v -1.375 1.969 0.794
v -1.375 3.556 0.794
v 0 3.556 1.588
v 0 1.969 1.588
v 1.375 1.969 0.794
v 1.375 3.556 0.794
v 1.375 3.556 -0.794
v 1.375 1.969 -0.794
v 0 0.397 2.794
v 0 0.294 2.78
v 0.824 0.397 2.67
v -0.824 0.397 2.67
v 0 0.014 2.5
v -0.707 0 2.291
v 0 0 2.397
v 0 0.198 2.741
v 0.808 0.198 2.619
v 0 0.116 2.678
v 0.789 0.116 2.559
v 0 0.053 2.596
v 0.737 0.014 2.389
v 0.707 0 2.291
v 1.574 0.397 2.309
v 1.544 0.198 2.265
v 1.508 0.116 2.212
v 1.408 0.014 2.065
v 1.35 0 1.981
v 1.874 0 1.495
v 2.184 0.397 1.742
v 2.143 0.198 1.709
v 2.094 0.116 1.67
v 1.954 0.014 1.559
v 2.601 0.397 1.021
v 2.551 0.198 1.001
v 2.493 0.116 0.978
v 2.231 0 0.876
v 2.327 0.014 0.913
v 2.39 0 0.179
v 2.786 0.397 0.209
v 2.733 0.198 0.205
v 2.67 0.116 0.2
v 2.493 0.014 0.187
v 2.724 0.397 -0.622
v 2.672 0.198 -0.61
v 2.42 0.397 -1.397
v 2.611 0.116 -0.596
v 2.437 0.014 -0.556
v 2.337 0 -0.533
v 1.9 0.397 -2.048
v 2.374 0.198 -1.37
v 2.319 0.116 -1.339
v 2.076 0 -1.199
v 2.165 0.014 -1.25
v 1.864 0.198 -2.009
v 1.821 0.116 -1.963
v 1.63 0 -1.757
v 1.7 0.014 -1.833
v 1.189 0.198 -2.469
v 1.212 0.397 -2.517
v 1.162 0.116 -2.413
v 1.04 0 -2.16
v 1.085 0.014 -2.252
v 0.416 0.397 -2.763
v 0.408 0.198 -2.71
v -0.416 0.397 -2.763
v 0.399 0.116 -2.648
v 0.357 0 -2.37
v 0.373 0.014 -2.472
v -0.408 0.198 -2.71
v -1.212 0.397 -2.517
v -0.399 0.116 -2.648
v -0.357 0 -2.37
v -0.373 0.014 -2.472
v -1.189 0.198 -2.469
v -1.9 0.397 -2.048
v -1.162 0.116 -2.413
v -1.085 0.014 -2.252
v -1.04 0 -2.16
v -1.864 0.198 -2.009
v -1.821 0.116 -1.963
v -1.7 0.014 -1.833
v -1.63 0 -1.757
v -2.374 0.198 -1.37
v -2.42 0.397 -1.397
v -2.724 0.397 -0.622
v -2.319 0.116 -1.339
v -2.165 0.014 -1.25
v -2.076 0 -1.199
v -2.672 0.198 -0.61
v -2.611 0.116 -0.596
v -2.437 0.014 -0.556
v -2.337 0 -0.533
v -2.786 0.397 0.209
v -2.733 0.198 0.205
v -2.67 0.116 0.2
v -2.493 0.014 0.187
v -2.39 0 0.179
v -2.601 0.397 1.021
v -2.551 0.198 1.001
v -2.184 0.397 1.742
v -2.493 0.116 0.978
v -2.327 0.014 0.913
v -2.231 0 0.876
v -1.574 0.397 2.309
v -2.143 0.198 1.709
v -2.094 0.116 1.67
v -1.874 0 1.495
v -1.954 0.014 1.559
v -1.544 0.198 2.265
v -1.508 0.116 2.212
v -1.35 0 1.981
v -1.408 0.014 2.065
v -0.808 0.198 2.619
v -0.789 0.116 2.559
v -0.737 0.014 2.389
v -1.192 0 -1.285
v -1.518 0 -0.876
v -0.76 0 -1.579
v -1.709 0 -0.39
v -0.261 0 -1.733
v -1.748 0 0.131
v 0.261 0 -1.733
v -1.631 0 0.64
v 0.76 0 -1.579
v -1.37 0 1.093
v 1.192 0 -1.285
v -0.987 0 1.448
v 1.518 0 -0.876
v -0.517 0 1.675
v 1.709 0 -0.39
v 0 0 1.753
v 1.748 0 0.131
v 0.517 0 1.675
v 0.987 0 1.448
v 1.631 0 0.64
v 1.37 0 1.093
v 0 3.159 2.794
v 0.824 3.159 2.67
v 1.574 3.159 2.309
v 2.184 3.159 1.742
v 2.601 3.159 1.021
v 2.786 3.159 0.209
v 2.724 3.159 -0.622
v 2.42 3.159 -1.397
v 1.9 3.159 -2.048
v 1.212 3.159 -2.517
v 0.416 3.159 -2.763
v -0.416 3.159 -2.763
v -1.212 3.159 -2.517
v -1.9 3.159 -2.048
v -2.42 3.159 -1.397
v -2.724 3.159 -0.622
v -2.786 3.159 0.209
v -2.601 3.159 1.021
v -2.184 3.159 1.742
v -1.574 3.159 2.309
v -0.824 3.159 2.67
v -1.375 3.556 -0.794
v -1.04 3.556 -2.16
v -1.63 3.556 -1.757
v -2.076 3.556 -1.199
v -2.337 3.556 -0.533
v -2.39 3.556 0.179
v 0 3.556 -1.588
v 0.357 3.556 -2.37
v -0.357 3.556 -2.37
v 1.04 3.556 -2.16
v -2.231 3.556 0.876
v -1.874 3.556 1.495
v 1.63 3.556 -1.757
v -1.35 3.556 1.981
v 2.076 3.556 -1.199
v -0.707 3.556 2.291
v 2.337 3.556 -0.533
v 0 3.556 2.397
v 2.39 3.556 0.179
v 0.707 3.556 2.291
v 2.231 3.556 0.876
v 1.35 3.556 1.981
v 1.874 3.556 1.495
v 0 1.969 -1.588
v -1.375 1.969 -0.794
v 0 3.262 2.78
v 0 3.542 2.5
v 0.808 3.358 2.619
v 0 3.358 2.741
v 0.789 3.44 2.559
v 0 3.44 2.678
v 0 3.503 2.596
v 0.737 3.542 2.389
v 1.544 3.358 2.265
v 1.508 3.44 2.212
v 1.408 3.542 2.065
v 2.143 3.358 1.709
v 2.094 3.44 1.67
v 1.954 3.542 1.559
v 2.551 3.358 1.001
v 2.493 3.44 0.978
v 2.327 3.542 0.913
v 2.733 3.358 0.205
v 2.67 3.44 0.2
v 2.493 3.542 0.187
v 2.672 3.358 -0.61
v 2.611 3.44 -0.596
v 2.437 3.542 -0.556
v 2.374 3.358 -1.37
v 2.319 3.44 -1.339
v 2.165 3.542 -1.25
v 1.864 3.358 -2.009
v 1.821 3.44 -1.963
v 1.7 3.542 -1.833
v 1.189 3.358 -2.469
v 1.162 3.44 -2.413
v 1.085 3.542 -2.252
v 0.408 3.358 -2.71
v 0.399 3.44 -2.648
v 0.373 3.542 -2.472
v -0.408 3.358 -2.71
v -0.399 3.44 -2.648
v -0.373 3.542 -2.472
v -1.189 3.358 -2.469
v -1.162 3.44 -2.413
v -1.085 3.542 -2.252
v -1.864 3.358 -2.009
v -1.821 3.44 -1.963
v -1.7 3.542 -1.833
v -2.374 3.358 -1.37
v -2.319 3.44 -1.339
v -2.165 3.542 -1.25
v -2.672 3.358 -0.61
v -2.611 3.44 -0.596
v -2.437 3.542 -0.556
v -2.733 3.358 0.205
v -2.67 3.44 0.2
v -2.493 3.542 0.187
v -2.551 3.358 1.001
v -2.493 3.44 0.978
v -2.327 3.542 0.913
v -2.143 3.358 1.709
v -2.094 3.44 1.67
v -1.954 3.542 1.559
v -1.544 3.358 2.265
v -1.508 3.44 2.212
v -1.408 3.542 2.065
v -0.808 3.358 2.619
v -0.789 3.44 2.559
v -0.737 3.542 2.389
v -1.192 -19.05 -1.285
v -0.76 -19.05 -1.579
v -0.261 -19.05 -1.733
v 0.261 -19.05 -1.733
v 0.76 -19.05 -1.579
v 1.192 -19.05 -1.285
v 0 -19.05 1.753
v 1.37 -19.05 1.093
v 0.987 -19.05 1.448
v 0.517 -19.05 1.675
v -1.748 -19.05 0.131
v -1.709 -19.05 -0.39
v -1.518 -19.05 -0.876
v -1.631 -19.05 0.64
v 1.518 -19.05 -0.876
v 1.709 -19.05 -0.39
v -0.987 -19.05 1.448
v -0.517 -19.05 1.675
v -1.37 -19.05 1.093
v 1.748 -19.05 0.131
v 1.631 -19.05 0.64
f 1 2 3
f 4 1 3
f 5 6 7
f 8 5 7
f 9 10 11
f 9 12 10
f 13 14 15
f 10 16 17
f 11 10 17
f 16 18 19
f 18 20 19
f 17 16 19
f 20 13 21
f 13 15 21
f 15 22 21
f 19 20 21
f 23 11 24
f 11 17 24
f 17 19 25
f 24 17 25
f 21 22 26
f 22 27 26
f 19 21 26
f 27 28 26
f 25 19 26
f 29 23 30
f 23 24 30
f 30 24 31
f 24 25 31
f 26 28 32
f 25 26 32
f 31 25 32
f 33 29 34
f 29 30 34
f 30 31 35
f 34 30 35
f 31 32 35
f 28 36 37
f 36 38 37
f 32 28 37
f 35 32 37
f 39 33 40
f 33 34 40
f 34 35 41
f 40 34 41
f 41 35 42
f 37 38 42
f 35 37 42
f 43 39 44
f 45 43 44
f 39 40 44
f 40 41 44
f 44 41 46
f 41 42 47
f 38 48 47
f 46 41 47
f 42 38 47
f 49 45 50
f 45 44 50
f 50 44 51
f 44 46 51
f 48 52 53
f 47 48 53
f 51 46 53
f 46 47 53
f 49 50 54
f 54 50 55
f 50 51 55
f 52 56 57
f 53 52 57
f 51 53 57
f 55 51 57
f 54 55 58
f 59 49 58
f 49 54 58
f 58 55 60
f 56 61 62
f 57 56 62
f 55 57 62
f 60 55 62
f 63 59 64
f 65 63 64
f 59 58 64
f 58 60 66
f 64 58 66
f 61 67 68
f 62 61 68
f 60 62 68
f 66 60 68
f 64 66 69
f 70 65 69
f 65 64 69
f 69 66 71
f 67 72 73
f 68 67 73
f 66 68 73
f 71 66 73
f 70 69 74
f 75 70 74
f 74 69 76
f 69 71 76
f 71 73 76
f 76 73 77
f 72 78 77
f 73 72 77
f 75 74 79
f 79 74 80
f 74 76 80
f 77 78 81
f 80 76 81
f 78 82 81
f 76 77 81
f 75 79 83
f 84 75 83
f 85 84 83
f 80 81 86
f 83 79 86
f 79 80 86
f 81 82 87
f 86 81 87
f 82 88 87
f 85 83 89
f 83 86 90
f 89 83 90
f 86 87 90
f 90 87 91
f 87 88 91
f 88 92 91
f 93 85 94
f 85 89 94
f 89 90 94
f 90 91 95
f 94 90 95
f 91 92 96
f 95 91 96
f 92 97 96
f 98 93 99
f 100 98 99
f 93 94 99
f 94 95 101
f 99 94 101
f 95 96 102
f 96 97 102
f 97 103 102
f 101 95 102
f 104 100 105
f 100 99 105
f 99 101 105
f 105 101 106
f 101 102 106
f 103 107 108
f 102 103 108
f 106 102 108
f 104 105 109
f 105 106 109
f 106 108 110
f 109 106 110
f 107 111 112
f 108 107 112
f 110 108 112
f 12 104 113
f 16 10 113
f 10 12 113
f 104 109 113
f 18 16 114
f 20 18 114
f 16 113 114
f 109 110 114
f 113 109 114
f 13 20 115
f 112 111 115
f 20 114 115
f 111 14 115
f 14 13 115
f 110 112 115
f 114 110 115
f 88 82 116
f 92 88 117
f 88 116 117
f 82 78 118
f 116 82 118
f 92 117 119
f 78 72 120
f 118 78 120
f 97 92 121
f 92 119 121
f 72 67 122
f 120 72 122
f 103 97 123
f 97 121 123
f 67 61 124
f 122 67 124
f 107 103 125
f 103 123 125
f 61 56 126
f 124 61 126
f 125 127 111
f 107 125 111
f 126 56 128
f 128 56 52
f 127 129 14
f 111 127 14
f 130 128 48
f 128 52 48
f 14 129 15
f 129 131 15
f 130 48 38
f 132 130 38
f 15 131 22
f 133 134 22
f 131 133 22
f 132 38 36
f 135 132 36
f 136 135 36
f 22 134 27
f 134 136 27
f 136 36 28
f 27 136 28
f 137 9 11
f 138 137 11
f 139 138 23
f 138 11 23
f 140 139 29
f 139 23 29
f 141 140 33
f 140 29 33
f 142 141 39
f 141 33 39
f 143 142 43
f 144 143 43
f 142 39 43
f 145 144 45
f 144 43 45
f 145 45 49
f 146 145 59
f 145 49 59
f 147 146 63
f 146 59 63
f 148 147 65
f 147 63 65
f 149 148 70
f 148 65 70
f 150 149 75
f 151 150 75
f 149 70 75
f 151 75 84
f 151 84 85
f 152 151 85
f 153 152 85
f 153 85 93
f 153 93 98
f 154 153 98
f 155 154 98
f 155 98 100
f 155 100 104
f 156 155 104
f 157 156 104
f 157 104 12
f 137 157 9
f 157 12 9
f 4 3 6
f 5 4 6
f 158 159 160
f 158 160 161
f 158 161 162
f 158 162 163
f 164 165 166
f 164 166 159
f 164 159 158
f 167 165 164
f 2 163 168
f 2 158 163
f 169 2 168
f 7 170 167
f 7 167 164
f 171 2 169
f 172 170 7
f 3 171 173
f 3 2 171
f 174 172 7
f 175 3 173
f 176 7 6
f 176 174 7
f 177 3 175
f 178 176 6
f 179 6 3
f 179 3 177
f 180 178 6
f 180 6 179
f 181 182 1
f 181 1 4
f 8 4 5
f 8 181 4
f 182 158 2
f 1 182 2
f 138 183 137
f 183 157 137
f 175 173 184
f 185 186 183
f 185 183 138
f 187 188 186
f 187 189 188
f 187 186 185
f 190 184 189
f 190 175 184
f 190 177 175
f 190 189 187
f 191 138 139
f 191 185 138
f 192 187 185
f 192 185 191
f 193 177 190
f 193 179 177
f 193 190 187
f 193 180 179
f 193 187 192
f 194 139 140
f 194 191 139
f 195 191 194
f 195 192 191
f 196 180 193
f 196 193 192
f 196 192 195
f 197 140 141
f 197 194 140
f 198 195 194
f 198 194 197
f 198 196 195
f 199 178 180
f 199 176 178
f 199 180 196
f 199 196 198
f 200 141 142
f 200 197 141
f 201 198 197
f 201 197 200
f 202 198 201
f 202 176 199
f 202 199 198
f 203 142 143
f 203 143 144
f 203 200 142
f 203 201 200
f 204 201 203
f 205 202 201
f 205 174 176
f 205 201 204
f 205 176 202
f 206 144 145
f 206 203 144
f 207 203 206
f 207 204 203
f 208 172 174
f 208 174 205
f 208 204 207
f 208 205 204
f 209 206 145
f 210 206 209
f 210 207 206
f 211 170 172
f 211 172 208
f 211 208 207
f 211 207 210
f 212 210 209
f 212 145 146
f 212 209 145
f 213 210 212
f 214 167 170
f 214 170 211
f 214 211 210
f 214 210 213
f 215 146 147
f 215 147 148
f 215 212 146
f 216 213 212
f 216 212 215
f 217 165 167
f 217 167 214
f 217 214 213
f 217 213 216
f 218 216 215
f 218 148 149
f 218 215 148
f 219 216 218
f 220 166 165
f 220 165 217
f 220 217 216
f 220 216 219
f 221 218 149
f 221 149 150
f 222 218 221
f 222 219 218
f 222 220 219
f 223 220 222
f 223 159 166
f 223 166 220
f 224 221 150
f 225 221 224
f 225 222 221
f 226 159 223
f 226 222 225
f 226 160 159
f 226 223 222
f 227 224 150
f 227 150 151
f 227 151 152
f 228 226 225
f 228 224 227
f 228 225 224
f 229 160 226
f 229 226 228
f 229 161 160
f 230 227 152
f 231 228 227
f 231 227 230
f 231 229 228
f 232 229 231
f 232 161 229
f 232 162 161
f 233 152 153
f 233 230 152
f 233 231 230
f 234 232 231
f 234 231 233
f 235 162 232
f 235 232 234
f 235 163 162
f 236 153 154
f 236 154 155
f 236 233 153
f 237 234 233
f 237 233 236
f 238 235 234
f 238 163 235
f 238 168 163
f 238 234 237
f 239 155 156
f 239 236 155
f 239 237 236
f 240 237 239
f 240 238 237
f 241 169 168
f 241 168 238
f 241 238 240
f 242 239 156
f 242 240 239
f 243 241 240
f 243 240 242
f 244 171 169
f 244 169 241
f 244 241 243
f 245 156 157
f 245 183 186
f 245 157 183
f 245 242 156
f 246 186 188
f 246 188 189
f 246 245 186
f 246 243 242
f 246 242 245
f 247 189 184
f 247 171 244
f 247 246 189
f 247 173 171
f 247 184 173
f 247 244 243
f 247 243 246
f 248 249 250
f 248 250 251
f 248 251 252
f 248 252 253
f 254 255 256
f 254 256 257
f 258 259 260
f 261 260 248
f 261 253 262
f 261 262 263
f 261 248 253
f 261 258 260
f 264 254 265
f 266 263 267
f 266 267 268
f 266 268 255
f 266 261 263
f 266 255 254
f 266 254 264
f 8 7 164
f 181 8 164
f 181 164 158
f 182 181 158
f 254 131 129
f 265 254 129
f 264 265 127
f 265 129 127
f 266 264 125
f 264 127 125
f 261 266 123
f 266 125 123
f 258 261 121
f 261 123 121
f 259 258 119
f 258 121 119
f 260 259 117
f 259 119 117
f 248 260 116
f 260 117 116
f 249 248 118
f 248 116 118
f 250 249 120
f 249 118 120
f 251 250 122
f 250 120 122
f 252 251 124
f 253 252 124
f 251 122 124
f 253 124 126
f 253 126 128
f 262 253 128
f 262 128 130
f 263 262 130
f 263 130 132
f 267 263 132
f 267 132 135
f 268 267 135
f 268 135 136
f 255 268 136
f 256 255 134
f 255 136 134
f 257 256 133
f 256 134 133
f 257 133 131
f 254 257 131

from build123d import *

# Parameters (mm, degrees)
SKETCH2_R           = 2.794
BOSS_EXTRUDE1_DEPTH = 3.556
SKETCH4_R           = 1.7526
BOSS_EXTRUDE2_DEPTH = 19.05
FILLET1_R           = 0.396875
CUT_EXTRUDE1_DEPTH  = 1.5875


with BuildPart() as part:
    # Sketch2 → Boss-Extrude1 (new body)
    with BuildSketch(Plane(origin=(0, 0, 0), x_dir=(1, 0, 0), z_dir=(0, 1, 0))):
        with Locations(Location((0, 0, 0), (0, 0, 270))):
            Circle(SKETCH2_R)
    extrude(amount=BOSS_EXTRUDE1_DEPTH)

    # Sketch4 → Boss-Extrude2 (add)
    with BuildSketch(Plane.XZ):
        with Locations(Location((0, 0, 0), (0, 0, 90))):
            Circle(SKETCH4_R)
    extrude(amount=BOSS_EXTRUDE2_DEPTH)

    # Fillet1
    fillet1_edges = [part.edges().sort_by_distance(p)[0] for p in [
        (0, 0, -2.794),
        (0, 3.556, -2.794),
    ]]
    fillet(fillet1_edges, radius=FILLET1_R)

    # Sketch5 → Cut-Extrude1 (cut)
    with BuildSketch(Plane(origin=(0, 3.556, 0), x_dir=(1, 0, 0), z_dir=(0, 1, 0))):
        Polygon((-1.374815329, 0.79375), (-1.374815329, -0.79375), (0, -1.5875), (1.374815329, -0.79375), (1.374815329, 0.79375), (0, 1.5875), align=None)
    extrude(amount=-CUT_EXTRUDE1_DEPTH, mode=Mode.SUBTRACT)


solid = part.part
